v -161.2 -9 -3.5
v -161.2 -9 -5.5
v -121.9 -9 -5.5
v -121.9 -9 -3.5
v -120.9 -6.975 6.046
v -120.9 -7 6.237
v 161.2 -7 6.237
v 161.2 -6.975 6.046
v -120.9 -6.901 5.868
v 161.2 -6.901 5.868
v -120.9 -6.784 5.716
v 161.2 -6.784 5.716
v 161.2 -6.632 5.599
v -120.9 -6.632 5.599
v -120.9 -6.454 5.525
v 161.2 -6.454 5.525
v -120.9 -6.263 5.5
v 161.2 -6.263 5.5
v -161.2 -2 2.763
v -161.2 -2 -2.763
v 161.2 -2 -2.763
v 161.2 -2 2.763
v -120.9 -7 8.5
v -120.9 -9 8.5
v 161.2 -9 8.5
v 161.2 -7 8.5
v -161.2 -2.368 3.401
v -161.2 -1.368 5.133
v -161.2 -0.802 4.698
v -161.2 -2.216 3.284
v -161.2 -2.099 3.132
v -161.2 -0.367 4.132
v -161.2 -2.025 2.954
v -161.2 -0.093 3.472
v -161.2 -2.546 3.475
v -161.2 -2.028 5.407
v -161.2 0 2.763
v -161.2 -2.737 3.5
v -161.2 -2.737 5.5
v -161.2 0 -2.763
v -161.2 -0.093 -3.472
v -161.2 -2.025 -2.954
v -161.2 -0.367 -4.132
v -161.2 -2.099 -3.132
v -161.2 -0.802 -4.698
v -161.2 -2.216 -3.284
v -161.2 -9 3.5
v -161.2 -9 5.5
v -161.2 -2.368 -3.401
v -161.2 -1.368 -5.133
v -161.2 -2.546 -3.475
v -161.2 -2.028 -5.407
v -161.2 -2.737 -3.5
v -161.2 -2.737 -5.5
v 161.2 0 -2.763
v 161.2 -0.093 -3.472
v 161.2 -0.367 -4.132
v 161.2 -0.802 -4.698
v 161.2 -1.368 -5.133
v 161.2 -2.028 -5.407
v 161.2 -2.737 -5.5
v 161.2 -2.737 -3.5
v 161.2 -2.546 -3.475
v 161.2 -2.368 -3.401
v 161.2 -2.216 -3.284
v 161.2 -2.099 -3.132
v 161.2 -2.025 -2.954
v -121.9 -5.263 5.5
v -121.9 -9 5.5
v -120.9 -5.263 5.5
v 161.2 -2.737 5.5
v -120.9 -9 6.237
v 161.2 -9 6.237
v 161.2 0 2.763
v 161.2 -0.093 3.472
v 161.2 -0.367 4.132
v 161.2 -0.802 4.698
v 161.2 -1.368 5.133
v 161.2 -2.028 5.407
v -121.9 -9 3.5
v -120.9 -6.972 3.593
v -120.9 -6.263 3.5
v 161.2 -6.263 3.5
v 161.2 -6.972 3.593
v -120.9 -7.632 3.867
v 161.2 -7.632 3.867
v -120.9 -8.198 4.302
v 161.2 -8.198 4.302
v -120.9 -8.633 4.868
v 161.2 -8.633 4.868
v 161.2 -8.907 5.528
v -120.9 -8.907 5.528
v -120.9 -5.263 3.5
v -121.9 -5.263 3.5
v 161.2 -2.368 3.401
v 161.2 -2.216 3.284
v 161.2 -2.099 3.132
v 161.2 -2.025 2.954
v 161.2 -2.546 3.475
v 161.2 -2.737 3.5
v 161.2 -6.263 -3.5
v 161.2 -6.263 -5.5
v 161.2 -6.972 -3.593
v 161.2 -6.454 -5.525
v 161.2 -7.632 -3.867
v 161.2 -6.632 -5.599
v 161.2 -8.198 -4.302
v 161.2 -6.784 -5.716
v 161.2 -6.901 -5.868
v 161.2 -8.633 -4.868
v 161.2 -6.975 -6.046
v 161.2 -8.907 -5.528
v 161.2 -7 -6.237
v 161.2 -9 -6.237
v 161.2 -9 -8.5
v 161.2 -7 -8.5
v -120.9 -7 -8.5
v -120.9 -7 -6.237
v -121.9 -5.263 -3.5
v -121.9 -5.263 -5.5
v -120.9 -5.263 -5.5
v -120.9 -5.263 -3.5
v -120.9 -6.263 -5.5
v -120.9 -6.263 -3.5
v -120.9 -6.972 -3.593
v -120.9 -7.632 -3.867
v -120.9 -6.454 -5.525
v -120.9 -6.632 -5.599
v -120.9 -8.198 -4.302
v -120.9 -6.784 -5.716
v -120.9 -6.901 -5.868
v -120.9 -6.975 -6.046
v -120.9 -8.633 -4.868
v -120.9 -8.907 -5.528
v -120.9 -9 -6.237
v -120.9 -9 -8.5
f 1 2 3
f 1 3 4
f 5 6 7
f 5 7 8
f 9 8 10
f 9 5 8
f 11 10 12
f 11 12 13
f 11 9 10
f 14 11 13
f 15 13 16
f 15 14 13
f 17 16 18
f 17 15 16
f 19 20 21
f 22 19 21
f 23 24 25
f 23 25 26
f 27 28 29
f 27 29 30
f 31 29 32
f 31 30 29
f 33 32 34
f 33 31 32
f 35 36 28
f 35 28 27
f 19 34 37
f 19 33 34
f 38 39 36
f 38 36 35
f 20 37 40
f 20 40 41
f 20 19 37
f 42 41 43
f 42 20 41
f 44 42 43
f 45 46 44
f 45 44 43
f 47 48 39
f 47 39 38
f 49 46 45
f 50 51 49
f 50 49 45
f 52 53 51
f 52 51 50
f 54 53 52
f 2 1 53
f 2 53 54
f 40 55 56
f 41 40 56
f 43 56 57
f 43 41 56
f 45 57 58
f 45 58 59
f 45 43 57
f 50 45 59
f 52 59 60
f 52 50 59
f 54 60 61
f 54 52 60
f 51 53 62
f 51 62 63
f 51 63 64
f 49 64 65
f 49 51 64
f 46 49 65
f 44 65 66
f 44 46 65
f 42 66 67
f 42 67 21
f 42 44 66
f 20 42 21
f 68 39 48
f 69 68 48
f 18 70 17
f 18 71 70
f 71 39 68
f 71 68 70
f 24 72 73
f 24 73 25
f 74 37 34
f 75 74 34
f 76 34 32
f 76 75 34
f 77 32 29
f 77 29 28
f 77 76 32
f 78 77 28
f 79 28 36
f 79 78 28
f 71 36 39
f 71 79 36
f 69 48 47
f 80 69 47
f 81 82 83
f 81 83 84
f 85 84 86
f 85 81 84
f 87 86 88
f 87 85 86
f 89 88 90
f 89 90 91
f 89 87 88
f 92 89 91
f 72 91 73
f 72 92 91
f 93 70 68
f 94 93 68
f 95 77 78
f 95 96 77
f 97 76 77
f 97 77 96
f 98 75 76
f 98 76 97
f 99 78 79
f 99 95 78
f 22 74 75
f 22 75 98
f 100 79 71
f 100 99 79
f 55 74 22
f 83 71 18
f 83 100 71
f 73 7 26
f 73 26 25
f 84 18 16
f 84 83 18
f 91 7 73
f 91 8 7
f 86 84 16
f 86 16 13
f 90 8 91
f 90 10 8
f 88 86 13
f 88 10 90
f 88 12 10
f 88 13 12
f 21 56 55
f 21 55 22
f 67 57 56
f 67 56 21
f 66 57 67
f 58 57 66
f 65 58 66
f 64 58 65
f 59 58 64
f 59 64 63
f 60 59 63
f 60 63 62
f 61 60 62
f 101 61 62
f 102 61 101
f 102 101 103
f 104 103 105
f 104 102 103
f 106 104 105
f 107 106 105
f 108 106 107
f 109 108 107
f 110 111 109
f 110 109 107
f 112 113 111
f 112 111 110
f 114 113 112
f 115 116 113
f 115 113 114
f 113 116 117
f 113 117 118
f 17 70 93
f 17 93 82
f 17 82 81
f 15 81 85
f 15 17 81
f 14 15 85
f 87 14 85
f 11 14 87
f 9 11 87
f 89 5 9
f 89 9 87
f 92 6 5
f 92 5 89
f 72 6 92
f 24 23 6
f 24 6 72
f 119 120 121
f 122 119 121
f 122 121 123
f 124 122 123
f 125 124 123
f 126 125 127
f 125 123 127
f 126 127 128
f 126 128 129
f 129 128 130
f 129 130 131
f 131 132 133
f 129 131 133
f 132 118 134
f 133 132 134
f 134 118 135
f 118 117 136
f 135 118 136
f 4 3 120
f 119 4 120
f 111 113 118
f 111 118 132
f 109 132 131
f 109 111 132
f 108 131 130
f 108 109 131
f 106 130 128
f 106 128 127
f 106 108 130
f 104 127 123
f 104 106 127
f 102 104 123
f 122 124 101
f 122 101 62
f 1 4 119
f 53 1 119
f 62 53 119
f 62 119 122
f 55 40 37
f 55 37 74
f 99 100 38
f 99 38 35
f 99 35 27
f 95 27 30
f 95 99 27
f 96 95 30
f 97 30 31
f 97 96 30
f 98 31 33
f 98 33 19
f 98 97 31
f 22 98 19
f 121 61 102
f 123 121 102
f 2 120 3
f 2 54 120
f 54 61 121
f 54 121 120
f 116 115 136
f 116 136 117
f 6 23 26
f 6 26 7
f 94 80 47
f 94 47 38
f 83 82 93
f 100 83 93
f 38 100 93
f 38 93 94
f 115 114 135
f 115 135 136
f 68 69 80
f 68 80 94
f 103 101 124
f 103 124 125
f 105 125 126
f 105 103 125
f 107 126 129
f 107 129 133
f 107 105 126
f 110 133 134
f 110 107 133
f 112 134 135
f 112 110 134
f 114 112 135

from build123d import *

# Parameters (mm, degrees)
SKETCH2_W                       = 322.4
SKETCH2_H                       = 11
BASE_FLANGE1_DEPTH              = 2
EDGE_FLANGE1_STRIP_W            = 9.4732
EDGE_FLANGE1_STRIP_H            = 2
EDGE_FLANGE1_STRIP_CUT_DEPTH    = 322.4
EDGE_FLANGE1_STRIP_2_W          = 9.4732
EDGE_FLANGE1_STRIP_2_H          = 2
EDGE_FLANGE1_STRIP_CUT_2_DEPTH  = 322.4
EDGE_FLANGE1_DEPTH              = 322.4
EDGE_FLANGE1_BEND_DEPTH         = 322.4
EDGE_FLANGE3_STRIP_W            = 9.4732
EDGE_FLANGE3_STRIP_H            = 2
EDGE_FLANGE3_STRIP_CUT_DEPTH    = 282.1
EDGE_FLANGE3_RELIEF_W           = 10.4732
EDGE_FLANGE3_RELIEF_H           = 1
EDGE_FLANGE3_RELIEF_CUT_DEPTH   = 2
EDGE_FLANGE3_STRIP_2_W          = 9.4732
EDGE_FLANGE3_STRIP_2_H          = 2
EDGE_FLANGE3_STRIP_CUT_2_DEPTH  = 282.1
EDGE_FLANGE3_RELIEF_2_W         = 10.4732
EDGE_FLANGE3_RELIEF_2_H         = 1
EDGE_FLANGE3_RELIEF_CUT_2_DEPTH = 2
EDGE_FLANGE3_DEPTH              = 282.1
EDGE_FLANGE3_BEND_DEPTH         = 282.1


# Sheet-metal steps are written as plain solids
with BuildPart() as part:
    # Sketch2 → Base-Flange1 (new body)
    with BuildSketch(Plane(origin=(0, 0, 0), x_dir=(1, 0, 0), z_dir=(0, 1, 0))):
        Rectangle(SKETCH2_W, SKETCH2_H)
    extrude(amount=-BASE_FLANGE1_DEPTH)

    # Edge-Flange1 strip (across the edge) → Edge-Flange1 strip cut (cut)
    with BuildSketch(Plane(origin=(161.2, -2, 5.5), x_dir=(0, 0, -1), z_dir=(-1, 0, 0))):
        with Locations((-2, -1)):
            Rectangle(EDGE_FLANGE1_STRIP_W, EDGE_FLANGE1_STRIP_H)
    extrude(amount=EDGE_FLANGE1_STRIP_CUT_DEPTH, mode=Mode.SUBTRACT)

    # Edge-Flange1 strip 2 (across the edge) → Edge-Flange1 strip cut 2 (cut)
    with BuildSketch(Plane(origin=(-161.2, -2, -5.5), x_dir=(0, 0, 1), z_dir=(1, 0, 0))):
        with Locations((-2, -1)):
            Rectangle(EDGE_FLANGE1_STRIP_2_W, EDGE_FLANGE1_STRIP_2_H)
    extrude(amount=EDGE_FLANGE1_STRIP_CUT_2_DEPTH, mode=Mode.SUBTRACT)

    # Edge-Flange1 section (across the edge) → Edge-Flange1 (add)
    with BuildSketch(Plane(origin=(161.2, -2, 5.5), x_dir=(0, 0, -1), z_dir=(-1, 0, 0))):
        with BuildLine():
            Line((0, 0.7366), (0, 7))
            Line((0, 7), (2, 7))
            Line((2, 7), (2, 0.7366))
            ThreePointArc((2, 0.7366), (2.215745145, 0.215745145), (2.7366, 0))
            Line((2.7366, 0), (2.7366, -2))
            ThreePointArc((2.7366, -2), (0.801531583, -1.198468417), (0, 0.7366))
        make_face()
    extrude(amount=EDGE_FLANGE1_DEPTH)

    # Edge-Flange1 section 2 (across the edge) → Edge-Flange1 bend (add)
    with BuildSketch(Plane(origin=(-161.2, -2, -5.5), x_dir=(0, 0, 1), z_dir=(1, 0, 0))):
        with BuildLine():
            Line((0, 0.7366), (0, 7))
            Line((0, 7), (2, 7))
            Line((2, 7), (2, 0.7366))
            ThreePointArc((2, 0.7366), (2.215745145, 0.215745145), (2.7366, 0))
            Line((2.7366, 0), (2.7366, -2))
            ThreePointArc((2.7366, -2), (0.801531583, -1.198468417), (0, 0.7366))
        make_face()
    extrude(amount=EDGE_FLANGE1_BEND_DEPTH)

    # Edge-Flange3 strip (across the edge) → Edge-Flange3 strip cut (cut)
    with BuildSketch(Plane(origin=(-120.9, -9, 5.5), x_dir=(0, 1, 0), z_dir=(1, 0, 0))):
        with Locations((-2, -1)):
            Rectangle(EDGE_FLANGE3_STRIP_W, EDGE_FLANGE3_STRIP_H)
    extrude(amount=EDGE_FLANGE3_STRIP_CUT_DEPTH, mode=Mode.SUBTRACT)

    # Edge-Flange3 relief (on the sheet) → Edge-Flange3 relief cut (cut)
    with BuildSketch(Plane(origin=(-120.9, -6.2634, 5.5), x_dir=(0, 1, 0), z_dir=(0, 0, 1))):
        with Locations((-4.2366, 0.5)):
            Rectangle(EDGE_FLANGE3_RELIEF_W, EDGE_FLANGE3_RELIEF_H)
    extrude(amount=-EDGE_FLANGE3_RELIEF_CUT_DEPTH, mode=Mode.SUBTRACT)

    # Edge-Flange3 strip 2 (across the edge) → Edge-Flange3 strip cut 2 (cut)
    with BuildSketch(Plane(origin=(161.2, -9, -5.5), x_dir=(0, 1, 0), z_dir=(-1, 0, 0))):
        with Locations((-2, -1)):
            Rectangle(EDGE_FLANGE3_STRIP_2_W, EDGE_FLANGE3_STRIP_2_H)
    extrude(amount=EDGE_FLANGE3_STRIP_CUT_2_DEPTH, mode=Mode.SUBTRACT)

    # Edge-Flange3 relief 2 (on the sheet) → Edge-Flange3 relief cut 2 (cut)
    with BuildSketch(Plane(origin=(161.2, -6.2634, -5.5), x_dir=(0, 1, 0), z_dir=(0, 0, -1))):
        with Locations((-4.2366, -282.6)):
            Rectangle(EDGE_FLANGE3_RELIEF_2_W, EDGE_FLANGE3_RELIEF_2_H)
    extrude(amount=-EDGE_FLANGE3_RELIEF_CUT_2_DEPTH, mode=Mode.SUBTRACT)

    # Edge-Flange3 section (across the edge) → Edge-Flange3 (add)
    with BuildSketch(Plane(origin=(-120.9, -9, 5.5), x_dir=(0, 1, 0), z_dir=(1, 0, 0))):
        with BuildLine():
            Line((0, 0.7366), (0, 3))
            Line((0, 3), (2, 3))
            Line((2, 3), (2, 0.7366))
            ThreePointArc((2, 0.7366), (2.215745145, 0.215745145), (2.7366, 0))
            Line((2.7366, 0), (2.7366, -2))
            ThreePointArc((2.7366, -2), (0.801531583, -1.198468417), (0, 0.7366))
        make_face()
    extrude(amount=EDGE_FLANGE3_DEPTH)

    # Edge-Flange3 section 2 (across the edge) → Edge-Flange3 bend (add)
    with BuildSketch(Plane(origin=(161.2, -9, -5.5), x_dir=(0, 1, 0), z_dir=(-1, 0, 0))):
        with BuildLine():
            Line((0, 0.7366), (0, 3))
            Line((0, 3), (2, 3))
            Line((2, 3), (2, 0.7366))
            ThreePointArc((2, 0.7366), (2.215745145, 0.215745145), (2.7366, 0))
            Line((2.7366, 0), (2.7366, -2))
            ThreePointArc((2.7366, -2), (0.801531583, -1.198468417), (0, 0.7366))
        make_face()
    extrude(amount=EDGE_FLANGE3_BEND_DEPTH)


solid = part.part
